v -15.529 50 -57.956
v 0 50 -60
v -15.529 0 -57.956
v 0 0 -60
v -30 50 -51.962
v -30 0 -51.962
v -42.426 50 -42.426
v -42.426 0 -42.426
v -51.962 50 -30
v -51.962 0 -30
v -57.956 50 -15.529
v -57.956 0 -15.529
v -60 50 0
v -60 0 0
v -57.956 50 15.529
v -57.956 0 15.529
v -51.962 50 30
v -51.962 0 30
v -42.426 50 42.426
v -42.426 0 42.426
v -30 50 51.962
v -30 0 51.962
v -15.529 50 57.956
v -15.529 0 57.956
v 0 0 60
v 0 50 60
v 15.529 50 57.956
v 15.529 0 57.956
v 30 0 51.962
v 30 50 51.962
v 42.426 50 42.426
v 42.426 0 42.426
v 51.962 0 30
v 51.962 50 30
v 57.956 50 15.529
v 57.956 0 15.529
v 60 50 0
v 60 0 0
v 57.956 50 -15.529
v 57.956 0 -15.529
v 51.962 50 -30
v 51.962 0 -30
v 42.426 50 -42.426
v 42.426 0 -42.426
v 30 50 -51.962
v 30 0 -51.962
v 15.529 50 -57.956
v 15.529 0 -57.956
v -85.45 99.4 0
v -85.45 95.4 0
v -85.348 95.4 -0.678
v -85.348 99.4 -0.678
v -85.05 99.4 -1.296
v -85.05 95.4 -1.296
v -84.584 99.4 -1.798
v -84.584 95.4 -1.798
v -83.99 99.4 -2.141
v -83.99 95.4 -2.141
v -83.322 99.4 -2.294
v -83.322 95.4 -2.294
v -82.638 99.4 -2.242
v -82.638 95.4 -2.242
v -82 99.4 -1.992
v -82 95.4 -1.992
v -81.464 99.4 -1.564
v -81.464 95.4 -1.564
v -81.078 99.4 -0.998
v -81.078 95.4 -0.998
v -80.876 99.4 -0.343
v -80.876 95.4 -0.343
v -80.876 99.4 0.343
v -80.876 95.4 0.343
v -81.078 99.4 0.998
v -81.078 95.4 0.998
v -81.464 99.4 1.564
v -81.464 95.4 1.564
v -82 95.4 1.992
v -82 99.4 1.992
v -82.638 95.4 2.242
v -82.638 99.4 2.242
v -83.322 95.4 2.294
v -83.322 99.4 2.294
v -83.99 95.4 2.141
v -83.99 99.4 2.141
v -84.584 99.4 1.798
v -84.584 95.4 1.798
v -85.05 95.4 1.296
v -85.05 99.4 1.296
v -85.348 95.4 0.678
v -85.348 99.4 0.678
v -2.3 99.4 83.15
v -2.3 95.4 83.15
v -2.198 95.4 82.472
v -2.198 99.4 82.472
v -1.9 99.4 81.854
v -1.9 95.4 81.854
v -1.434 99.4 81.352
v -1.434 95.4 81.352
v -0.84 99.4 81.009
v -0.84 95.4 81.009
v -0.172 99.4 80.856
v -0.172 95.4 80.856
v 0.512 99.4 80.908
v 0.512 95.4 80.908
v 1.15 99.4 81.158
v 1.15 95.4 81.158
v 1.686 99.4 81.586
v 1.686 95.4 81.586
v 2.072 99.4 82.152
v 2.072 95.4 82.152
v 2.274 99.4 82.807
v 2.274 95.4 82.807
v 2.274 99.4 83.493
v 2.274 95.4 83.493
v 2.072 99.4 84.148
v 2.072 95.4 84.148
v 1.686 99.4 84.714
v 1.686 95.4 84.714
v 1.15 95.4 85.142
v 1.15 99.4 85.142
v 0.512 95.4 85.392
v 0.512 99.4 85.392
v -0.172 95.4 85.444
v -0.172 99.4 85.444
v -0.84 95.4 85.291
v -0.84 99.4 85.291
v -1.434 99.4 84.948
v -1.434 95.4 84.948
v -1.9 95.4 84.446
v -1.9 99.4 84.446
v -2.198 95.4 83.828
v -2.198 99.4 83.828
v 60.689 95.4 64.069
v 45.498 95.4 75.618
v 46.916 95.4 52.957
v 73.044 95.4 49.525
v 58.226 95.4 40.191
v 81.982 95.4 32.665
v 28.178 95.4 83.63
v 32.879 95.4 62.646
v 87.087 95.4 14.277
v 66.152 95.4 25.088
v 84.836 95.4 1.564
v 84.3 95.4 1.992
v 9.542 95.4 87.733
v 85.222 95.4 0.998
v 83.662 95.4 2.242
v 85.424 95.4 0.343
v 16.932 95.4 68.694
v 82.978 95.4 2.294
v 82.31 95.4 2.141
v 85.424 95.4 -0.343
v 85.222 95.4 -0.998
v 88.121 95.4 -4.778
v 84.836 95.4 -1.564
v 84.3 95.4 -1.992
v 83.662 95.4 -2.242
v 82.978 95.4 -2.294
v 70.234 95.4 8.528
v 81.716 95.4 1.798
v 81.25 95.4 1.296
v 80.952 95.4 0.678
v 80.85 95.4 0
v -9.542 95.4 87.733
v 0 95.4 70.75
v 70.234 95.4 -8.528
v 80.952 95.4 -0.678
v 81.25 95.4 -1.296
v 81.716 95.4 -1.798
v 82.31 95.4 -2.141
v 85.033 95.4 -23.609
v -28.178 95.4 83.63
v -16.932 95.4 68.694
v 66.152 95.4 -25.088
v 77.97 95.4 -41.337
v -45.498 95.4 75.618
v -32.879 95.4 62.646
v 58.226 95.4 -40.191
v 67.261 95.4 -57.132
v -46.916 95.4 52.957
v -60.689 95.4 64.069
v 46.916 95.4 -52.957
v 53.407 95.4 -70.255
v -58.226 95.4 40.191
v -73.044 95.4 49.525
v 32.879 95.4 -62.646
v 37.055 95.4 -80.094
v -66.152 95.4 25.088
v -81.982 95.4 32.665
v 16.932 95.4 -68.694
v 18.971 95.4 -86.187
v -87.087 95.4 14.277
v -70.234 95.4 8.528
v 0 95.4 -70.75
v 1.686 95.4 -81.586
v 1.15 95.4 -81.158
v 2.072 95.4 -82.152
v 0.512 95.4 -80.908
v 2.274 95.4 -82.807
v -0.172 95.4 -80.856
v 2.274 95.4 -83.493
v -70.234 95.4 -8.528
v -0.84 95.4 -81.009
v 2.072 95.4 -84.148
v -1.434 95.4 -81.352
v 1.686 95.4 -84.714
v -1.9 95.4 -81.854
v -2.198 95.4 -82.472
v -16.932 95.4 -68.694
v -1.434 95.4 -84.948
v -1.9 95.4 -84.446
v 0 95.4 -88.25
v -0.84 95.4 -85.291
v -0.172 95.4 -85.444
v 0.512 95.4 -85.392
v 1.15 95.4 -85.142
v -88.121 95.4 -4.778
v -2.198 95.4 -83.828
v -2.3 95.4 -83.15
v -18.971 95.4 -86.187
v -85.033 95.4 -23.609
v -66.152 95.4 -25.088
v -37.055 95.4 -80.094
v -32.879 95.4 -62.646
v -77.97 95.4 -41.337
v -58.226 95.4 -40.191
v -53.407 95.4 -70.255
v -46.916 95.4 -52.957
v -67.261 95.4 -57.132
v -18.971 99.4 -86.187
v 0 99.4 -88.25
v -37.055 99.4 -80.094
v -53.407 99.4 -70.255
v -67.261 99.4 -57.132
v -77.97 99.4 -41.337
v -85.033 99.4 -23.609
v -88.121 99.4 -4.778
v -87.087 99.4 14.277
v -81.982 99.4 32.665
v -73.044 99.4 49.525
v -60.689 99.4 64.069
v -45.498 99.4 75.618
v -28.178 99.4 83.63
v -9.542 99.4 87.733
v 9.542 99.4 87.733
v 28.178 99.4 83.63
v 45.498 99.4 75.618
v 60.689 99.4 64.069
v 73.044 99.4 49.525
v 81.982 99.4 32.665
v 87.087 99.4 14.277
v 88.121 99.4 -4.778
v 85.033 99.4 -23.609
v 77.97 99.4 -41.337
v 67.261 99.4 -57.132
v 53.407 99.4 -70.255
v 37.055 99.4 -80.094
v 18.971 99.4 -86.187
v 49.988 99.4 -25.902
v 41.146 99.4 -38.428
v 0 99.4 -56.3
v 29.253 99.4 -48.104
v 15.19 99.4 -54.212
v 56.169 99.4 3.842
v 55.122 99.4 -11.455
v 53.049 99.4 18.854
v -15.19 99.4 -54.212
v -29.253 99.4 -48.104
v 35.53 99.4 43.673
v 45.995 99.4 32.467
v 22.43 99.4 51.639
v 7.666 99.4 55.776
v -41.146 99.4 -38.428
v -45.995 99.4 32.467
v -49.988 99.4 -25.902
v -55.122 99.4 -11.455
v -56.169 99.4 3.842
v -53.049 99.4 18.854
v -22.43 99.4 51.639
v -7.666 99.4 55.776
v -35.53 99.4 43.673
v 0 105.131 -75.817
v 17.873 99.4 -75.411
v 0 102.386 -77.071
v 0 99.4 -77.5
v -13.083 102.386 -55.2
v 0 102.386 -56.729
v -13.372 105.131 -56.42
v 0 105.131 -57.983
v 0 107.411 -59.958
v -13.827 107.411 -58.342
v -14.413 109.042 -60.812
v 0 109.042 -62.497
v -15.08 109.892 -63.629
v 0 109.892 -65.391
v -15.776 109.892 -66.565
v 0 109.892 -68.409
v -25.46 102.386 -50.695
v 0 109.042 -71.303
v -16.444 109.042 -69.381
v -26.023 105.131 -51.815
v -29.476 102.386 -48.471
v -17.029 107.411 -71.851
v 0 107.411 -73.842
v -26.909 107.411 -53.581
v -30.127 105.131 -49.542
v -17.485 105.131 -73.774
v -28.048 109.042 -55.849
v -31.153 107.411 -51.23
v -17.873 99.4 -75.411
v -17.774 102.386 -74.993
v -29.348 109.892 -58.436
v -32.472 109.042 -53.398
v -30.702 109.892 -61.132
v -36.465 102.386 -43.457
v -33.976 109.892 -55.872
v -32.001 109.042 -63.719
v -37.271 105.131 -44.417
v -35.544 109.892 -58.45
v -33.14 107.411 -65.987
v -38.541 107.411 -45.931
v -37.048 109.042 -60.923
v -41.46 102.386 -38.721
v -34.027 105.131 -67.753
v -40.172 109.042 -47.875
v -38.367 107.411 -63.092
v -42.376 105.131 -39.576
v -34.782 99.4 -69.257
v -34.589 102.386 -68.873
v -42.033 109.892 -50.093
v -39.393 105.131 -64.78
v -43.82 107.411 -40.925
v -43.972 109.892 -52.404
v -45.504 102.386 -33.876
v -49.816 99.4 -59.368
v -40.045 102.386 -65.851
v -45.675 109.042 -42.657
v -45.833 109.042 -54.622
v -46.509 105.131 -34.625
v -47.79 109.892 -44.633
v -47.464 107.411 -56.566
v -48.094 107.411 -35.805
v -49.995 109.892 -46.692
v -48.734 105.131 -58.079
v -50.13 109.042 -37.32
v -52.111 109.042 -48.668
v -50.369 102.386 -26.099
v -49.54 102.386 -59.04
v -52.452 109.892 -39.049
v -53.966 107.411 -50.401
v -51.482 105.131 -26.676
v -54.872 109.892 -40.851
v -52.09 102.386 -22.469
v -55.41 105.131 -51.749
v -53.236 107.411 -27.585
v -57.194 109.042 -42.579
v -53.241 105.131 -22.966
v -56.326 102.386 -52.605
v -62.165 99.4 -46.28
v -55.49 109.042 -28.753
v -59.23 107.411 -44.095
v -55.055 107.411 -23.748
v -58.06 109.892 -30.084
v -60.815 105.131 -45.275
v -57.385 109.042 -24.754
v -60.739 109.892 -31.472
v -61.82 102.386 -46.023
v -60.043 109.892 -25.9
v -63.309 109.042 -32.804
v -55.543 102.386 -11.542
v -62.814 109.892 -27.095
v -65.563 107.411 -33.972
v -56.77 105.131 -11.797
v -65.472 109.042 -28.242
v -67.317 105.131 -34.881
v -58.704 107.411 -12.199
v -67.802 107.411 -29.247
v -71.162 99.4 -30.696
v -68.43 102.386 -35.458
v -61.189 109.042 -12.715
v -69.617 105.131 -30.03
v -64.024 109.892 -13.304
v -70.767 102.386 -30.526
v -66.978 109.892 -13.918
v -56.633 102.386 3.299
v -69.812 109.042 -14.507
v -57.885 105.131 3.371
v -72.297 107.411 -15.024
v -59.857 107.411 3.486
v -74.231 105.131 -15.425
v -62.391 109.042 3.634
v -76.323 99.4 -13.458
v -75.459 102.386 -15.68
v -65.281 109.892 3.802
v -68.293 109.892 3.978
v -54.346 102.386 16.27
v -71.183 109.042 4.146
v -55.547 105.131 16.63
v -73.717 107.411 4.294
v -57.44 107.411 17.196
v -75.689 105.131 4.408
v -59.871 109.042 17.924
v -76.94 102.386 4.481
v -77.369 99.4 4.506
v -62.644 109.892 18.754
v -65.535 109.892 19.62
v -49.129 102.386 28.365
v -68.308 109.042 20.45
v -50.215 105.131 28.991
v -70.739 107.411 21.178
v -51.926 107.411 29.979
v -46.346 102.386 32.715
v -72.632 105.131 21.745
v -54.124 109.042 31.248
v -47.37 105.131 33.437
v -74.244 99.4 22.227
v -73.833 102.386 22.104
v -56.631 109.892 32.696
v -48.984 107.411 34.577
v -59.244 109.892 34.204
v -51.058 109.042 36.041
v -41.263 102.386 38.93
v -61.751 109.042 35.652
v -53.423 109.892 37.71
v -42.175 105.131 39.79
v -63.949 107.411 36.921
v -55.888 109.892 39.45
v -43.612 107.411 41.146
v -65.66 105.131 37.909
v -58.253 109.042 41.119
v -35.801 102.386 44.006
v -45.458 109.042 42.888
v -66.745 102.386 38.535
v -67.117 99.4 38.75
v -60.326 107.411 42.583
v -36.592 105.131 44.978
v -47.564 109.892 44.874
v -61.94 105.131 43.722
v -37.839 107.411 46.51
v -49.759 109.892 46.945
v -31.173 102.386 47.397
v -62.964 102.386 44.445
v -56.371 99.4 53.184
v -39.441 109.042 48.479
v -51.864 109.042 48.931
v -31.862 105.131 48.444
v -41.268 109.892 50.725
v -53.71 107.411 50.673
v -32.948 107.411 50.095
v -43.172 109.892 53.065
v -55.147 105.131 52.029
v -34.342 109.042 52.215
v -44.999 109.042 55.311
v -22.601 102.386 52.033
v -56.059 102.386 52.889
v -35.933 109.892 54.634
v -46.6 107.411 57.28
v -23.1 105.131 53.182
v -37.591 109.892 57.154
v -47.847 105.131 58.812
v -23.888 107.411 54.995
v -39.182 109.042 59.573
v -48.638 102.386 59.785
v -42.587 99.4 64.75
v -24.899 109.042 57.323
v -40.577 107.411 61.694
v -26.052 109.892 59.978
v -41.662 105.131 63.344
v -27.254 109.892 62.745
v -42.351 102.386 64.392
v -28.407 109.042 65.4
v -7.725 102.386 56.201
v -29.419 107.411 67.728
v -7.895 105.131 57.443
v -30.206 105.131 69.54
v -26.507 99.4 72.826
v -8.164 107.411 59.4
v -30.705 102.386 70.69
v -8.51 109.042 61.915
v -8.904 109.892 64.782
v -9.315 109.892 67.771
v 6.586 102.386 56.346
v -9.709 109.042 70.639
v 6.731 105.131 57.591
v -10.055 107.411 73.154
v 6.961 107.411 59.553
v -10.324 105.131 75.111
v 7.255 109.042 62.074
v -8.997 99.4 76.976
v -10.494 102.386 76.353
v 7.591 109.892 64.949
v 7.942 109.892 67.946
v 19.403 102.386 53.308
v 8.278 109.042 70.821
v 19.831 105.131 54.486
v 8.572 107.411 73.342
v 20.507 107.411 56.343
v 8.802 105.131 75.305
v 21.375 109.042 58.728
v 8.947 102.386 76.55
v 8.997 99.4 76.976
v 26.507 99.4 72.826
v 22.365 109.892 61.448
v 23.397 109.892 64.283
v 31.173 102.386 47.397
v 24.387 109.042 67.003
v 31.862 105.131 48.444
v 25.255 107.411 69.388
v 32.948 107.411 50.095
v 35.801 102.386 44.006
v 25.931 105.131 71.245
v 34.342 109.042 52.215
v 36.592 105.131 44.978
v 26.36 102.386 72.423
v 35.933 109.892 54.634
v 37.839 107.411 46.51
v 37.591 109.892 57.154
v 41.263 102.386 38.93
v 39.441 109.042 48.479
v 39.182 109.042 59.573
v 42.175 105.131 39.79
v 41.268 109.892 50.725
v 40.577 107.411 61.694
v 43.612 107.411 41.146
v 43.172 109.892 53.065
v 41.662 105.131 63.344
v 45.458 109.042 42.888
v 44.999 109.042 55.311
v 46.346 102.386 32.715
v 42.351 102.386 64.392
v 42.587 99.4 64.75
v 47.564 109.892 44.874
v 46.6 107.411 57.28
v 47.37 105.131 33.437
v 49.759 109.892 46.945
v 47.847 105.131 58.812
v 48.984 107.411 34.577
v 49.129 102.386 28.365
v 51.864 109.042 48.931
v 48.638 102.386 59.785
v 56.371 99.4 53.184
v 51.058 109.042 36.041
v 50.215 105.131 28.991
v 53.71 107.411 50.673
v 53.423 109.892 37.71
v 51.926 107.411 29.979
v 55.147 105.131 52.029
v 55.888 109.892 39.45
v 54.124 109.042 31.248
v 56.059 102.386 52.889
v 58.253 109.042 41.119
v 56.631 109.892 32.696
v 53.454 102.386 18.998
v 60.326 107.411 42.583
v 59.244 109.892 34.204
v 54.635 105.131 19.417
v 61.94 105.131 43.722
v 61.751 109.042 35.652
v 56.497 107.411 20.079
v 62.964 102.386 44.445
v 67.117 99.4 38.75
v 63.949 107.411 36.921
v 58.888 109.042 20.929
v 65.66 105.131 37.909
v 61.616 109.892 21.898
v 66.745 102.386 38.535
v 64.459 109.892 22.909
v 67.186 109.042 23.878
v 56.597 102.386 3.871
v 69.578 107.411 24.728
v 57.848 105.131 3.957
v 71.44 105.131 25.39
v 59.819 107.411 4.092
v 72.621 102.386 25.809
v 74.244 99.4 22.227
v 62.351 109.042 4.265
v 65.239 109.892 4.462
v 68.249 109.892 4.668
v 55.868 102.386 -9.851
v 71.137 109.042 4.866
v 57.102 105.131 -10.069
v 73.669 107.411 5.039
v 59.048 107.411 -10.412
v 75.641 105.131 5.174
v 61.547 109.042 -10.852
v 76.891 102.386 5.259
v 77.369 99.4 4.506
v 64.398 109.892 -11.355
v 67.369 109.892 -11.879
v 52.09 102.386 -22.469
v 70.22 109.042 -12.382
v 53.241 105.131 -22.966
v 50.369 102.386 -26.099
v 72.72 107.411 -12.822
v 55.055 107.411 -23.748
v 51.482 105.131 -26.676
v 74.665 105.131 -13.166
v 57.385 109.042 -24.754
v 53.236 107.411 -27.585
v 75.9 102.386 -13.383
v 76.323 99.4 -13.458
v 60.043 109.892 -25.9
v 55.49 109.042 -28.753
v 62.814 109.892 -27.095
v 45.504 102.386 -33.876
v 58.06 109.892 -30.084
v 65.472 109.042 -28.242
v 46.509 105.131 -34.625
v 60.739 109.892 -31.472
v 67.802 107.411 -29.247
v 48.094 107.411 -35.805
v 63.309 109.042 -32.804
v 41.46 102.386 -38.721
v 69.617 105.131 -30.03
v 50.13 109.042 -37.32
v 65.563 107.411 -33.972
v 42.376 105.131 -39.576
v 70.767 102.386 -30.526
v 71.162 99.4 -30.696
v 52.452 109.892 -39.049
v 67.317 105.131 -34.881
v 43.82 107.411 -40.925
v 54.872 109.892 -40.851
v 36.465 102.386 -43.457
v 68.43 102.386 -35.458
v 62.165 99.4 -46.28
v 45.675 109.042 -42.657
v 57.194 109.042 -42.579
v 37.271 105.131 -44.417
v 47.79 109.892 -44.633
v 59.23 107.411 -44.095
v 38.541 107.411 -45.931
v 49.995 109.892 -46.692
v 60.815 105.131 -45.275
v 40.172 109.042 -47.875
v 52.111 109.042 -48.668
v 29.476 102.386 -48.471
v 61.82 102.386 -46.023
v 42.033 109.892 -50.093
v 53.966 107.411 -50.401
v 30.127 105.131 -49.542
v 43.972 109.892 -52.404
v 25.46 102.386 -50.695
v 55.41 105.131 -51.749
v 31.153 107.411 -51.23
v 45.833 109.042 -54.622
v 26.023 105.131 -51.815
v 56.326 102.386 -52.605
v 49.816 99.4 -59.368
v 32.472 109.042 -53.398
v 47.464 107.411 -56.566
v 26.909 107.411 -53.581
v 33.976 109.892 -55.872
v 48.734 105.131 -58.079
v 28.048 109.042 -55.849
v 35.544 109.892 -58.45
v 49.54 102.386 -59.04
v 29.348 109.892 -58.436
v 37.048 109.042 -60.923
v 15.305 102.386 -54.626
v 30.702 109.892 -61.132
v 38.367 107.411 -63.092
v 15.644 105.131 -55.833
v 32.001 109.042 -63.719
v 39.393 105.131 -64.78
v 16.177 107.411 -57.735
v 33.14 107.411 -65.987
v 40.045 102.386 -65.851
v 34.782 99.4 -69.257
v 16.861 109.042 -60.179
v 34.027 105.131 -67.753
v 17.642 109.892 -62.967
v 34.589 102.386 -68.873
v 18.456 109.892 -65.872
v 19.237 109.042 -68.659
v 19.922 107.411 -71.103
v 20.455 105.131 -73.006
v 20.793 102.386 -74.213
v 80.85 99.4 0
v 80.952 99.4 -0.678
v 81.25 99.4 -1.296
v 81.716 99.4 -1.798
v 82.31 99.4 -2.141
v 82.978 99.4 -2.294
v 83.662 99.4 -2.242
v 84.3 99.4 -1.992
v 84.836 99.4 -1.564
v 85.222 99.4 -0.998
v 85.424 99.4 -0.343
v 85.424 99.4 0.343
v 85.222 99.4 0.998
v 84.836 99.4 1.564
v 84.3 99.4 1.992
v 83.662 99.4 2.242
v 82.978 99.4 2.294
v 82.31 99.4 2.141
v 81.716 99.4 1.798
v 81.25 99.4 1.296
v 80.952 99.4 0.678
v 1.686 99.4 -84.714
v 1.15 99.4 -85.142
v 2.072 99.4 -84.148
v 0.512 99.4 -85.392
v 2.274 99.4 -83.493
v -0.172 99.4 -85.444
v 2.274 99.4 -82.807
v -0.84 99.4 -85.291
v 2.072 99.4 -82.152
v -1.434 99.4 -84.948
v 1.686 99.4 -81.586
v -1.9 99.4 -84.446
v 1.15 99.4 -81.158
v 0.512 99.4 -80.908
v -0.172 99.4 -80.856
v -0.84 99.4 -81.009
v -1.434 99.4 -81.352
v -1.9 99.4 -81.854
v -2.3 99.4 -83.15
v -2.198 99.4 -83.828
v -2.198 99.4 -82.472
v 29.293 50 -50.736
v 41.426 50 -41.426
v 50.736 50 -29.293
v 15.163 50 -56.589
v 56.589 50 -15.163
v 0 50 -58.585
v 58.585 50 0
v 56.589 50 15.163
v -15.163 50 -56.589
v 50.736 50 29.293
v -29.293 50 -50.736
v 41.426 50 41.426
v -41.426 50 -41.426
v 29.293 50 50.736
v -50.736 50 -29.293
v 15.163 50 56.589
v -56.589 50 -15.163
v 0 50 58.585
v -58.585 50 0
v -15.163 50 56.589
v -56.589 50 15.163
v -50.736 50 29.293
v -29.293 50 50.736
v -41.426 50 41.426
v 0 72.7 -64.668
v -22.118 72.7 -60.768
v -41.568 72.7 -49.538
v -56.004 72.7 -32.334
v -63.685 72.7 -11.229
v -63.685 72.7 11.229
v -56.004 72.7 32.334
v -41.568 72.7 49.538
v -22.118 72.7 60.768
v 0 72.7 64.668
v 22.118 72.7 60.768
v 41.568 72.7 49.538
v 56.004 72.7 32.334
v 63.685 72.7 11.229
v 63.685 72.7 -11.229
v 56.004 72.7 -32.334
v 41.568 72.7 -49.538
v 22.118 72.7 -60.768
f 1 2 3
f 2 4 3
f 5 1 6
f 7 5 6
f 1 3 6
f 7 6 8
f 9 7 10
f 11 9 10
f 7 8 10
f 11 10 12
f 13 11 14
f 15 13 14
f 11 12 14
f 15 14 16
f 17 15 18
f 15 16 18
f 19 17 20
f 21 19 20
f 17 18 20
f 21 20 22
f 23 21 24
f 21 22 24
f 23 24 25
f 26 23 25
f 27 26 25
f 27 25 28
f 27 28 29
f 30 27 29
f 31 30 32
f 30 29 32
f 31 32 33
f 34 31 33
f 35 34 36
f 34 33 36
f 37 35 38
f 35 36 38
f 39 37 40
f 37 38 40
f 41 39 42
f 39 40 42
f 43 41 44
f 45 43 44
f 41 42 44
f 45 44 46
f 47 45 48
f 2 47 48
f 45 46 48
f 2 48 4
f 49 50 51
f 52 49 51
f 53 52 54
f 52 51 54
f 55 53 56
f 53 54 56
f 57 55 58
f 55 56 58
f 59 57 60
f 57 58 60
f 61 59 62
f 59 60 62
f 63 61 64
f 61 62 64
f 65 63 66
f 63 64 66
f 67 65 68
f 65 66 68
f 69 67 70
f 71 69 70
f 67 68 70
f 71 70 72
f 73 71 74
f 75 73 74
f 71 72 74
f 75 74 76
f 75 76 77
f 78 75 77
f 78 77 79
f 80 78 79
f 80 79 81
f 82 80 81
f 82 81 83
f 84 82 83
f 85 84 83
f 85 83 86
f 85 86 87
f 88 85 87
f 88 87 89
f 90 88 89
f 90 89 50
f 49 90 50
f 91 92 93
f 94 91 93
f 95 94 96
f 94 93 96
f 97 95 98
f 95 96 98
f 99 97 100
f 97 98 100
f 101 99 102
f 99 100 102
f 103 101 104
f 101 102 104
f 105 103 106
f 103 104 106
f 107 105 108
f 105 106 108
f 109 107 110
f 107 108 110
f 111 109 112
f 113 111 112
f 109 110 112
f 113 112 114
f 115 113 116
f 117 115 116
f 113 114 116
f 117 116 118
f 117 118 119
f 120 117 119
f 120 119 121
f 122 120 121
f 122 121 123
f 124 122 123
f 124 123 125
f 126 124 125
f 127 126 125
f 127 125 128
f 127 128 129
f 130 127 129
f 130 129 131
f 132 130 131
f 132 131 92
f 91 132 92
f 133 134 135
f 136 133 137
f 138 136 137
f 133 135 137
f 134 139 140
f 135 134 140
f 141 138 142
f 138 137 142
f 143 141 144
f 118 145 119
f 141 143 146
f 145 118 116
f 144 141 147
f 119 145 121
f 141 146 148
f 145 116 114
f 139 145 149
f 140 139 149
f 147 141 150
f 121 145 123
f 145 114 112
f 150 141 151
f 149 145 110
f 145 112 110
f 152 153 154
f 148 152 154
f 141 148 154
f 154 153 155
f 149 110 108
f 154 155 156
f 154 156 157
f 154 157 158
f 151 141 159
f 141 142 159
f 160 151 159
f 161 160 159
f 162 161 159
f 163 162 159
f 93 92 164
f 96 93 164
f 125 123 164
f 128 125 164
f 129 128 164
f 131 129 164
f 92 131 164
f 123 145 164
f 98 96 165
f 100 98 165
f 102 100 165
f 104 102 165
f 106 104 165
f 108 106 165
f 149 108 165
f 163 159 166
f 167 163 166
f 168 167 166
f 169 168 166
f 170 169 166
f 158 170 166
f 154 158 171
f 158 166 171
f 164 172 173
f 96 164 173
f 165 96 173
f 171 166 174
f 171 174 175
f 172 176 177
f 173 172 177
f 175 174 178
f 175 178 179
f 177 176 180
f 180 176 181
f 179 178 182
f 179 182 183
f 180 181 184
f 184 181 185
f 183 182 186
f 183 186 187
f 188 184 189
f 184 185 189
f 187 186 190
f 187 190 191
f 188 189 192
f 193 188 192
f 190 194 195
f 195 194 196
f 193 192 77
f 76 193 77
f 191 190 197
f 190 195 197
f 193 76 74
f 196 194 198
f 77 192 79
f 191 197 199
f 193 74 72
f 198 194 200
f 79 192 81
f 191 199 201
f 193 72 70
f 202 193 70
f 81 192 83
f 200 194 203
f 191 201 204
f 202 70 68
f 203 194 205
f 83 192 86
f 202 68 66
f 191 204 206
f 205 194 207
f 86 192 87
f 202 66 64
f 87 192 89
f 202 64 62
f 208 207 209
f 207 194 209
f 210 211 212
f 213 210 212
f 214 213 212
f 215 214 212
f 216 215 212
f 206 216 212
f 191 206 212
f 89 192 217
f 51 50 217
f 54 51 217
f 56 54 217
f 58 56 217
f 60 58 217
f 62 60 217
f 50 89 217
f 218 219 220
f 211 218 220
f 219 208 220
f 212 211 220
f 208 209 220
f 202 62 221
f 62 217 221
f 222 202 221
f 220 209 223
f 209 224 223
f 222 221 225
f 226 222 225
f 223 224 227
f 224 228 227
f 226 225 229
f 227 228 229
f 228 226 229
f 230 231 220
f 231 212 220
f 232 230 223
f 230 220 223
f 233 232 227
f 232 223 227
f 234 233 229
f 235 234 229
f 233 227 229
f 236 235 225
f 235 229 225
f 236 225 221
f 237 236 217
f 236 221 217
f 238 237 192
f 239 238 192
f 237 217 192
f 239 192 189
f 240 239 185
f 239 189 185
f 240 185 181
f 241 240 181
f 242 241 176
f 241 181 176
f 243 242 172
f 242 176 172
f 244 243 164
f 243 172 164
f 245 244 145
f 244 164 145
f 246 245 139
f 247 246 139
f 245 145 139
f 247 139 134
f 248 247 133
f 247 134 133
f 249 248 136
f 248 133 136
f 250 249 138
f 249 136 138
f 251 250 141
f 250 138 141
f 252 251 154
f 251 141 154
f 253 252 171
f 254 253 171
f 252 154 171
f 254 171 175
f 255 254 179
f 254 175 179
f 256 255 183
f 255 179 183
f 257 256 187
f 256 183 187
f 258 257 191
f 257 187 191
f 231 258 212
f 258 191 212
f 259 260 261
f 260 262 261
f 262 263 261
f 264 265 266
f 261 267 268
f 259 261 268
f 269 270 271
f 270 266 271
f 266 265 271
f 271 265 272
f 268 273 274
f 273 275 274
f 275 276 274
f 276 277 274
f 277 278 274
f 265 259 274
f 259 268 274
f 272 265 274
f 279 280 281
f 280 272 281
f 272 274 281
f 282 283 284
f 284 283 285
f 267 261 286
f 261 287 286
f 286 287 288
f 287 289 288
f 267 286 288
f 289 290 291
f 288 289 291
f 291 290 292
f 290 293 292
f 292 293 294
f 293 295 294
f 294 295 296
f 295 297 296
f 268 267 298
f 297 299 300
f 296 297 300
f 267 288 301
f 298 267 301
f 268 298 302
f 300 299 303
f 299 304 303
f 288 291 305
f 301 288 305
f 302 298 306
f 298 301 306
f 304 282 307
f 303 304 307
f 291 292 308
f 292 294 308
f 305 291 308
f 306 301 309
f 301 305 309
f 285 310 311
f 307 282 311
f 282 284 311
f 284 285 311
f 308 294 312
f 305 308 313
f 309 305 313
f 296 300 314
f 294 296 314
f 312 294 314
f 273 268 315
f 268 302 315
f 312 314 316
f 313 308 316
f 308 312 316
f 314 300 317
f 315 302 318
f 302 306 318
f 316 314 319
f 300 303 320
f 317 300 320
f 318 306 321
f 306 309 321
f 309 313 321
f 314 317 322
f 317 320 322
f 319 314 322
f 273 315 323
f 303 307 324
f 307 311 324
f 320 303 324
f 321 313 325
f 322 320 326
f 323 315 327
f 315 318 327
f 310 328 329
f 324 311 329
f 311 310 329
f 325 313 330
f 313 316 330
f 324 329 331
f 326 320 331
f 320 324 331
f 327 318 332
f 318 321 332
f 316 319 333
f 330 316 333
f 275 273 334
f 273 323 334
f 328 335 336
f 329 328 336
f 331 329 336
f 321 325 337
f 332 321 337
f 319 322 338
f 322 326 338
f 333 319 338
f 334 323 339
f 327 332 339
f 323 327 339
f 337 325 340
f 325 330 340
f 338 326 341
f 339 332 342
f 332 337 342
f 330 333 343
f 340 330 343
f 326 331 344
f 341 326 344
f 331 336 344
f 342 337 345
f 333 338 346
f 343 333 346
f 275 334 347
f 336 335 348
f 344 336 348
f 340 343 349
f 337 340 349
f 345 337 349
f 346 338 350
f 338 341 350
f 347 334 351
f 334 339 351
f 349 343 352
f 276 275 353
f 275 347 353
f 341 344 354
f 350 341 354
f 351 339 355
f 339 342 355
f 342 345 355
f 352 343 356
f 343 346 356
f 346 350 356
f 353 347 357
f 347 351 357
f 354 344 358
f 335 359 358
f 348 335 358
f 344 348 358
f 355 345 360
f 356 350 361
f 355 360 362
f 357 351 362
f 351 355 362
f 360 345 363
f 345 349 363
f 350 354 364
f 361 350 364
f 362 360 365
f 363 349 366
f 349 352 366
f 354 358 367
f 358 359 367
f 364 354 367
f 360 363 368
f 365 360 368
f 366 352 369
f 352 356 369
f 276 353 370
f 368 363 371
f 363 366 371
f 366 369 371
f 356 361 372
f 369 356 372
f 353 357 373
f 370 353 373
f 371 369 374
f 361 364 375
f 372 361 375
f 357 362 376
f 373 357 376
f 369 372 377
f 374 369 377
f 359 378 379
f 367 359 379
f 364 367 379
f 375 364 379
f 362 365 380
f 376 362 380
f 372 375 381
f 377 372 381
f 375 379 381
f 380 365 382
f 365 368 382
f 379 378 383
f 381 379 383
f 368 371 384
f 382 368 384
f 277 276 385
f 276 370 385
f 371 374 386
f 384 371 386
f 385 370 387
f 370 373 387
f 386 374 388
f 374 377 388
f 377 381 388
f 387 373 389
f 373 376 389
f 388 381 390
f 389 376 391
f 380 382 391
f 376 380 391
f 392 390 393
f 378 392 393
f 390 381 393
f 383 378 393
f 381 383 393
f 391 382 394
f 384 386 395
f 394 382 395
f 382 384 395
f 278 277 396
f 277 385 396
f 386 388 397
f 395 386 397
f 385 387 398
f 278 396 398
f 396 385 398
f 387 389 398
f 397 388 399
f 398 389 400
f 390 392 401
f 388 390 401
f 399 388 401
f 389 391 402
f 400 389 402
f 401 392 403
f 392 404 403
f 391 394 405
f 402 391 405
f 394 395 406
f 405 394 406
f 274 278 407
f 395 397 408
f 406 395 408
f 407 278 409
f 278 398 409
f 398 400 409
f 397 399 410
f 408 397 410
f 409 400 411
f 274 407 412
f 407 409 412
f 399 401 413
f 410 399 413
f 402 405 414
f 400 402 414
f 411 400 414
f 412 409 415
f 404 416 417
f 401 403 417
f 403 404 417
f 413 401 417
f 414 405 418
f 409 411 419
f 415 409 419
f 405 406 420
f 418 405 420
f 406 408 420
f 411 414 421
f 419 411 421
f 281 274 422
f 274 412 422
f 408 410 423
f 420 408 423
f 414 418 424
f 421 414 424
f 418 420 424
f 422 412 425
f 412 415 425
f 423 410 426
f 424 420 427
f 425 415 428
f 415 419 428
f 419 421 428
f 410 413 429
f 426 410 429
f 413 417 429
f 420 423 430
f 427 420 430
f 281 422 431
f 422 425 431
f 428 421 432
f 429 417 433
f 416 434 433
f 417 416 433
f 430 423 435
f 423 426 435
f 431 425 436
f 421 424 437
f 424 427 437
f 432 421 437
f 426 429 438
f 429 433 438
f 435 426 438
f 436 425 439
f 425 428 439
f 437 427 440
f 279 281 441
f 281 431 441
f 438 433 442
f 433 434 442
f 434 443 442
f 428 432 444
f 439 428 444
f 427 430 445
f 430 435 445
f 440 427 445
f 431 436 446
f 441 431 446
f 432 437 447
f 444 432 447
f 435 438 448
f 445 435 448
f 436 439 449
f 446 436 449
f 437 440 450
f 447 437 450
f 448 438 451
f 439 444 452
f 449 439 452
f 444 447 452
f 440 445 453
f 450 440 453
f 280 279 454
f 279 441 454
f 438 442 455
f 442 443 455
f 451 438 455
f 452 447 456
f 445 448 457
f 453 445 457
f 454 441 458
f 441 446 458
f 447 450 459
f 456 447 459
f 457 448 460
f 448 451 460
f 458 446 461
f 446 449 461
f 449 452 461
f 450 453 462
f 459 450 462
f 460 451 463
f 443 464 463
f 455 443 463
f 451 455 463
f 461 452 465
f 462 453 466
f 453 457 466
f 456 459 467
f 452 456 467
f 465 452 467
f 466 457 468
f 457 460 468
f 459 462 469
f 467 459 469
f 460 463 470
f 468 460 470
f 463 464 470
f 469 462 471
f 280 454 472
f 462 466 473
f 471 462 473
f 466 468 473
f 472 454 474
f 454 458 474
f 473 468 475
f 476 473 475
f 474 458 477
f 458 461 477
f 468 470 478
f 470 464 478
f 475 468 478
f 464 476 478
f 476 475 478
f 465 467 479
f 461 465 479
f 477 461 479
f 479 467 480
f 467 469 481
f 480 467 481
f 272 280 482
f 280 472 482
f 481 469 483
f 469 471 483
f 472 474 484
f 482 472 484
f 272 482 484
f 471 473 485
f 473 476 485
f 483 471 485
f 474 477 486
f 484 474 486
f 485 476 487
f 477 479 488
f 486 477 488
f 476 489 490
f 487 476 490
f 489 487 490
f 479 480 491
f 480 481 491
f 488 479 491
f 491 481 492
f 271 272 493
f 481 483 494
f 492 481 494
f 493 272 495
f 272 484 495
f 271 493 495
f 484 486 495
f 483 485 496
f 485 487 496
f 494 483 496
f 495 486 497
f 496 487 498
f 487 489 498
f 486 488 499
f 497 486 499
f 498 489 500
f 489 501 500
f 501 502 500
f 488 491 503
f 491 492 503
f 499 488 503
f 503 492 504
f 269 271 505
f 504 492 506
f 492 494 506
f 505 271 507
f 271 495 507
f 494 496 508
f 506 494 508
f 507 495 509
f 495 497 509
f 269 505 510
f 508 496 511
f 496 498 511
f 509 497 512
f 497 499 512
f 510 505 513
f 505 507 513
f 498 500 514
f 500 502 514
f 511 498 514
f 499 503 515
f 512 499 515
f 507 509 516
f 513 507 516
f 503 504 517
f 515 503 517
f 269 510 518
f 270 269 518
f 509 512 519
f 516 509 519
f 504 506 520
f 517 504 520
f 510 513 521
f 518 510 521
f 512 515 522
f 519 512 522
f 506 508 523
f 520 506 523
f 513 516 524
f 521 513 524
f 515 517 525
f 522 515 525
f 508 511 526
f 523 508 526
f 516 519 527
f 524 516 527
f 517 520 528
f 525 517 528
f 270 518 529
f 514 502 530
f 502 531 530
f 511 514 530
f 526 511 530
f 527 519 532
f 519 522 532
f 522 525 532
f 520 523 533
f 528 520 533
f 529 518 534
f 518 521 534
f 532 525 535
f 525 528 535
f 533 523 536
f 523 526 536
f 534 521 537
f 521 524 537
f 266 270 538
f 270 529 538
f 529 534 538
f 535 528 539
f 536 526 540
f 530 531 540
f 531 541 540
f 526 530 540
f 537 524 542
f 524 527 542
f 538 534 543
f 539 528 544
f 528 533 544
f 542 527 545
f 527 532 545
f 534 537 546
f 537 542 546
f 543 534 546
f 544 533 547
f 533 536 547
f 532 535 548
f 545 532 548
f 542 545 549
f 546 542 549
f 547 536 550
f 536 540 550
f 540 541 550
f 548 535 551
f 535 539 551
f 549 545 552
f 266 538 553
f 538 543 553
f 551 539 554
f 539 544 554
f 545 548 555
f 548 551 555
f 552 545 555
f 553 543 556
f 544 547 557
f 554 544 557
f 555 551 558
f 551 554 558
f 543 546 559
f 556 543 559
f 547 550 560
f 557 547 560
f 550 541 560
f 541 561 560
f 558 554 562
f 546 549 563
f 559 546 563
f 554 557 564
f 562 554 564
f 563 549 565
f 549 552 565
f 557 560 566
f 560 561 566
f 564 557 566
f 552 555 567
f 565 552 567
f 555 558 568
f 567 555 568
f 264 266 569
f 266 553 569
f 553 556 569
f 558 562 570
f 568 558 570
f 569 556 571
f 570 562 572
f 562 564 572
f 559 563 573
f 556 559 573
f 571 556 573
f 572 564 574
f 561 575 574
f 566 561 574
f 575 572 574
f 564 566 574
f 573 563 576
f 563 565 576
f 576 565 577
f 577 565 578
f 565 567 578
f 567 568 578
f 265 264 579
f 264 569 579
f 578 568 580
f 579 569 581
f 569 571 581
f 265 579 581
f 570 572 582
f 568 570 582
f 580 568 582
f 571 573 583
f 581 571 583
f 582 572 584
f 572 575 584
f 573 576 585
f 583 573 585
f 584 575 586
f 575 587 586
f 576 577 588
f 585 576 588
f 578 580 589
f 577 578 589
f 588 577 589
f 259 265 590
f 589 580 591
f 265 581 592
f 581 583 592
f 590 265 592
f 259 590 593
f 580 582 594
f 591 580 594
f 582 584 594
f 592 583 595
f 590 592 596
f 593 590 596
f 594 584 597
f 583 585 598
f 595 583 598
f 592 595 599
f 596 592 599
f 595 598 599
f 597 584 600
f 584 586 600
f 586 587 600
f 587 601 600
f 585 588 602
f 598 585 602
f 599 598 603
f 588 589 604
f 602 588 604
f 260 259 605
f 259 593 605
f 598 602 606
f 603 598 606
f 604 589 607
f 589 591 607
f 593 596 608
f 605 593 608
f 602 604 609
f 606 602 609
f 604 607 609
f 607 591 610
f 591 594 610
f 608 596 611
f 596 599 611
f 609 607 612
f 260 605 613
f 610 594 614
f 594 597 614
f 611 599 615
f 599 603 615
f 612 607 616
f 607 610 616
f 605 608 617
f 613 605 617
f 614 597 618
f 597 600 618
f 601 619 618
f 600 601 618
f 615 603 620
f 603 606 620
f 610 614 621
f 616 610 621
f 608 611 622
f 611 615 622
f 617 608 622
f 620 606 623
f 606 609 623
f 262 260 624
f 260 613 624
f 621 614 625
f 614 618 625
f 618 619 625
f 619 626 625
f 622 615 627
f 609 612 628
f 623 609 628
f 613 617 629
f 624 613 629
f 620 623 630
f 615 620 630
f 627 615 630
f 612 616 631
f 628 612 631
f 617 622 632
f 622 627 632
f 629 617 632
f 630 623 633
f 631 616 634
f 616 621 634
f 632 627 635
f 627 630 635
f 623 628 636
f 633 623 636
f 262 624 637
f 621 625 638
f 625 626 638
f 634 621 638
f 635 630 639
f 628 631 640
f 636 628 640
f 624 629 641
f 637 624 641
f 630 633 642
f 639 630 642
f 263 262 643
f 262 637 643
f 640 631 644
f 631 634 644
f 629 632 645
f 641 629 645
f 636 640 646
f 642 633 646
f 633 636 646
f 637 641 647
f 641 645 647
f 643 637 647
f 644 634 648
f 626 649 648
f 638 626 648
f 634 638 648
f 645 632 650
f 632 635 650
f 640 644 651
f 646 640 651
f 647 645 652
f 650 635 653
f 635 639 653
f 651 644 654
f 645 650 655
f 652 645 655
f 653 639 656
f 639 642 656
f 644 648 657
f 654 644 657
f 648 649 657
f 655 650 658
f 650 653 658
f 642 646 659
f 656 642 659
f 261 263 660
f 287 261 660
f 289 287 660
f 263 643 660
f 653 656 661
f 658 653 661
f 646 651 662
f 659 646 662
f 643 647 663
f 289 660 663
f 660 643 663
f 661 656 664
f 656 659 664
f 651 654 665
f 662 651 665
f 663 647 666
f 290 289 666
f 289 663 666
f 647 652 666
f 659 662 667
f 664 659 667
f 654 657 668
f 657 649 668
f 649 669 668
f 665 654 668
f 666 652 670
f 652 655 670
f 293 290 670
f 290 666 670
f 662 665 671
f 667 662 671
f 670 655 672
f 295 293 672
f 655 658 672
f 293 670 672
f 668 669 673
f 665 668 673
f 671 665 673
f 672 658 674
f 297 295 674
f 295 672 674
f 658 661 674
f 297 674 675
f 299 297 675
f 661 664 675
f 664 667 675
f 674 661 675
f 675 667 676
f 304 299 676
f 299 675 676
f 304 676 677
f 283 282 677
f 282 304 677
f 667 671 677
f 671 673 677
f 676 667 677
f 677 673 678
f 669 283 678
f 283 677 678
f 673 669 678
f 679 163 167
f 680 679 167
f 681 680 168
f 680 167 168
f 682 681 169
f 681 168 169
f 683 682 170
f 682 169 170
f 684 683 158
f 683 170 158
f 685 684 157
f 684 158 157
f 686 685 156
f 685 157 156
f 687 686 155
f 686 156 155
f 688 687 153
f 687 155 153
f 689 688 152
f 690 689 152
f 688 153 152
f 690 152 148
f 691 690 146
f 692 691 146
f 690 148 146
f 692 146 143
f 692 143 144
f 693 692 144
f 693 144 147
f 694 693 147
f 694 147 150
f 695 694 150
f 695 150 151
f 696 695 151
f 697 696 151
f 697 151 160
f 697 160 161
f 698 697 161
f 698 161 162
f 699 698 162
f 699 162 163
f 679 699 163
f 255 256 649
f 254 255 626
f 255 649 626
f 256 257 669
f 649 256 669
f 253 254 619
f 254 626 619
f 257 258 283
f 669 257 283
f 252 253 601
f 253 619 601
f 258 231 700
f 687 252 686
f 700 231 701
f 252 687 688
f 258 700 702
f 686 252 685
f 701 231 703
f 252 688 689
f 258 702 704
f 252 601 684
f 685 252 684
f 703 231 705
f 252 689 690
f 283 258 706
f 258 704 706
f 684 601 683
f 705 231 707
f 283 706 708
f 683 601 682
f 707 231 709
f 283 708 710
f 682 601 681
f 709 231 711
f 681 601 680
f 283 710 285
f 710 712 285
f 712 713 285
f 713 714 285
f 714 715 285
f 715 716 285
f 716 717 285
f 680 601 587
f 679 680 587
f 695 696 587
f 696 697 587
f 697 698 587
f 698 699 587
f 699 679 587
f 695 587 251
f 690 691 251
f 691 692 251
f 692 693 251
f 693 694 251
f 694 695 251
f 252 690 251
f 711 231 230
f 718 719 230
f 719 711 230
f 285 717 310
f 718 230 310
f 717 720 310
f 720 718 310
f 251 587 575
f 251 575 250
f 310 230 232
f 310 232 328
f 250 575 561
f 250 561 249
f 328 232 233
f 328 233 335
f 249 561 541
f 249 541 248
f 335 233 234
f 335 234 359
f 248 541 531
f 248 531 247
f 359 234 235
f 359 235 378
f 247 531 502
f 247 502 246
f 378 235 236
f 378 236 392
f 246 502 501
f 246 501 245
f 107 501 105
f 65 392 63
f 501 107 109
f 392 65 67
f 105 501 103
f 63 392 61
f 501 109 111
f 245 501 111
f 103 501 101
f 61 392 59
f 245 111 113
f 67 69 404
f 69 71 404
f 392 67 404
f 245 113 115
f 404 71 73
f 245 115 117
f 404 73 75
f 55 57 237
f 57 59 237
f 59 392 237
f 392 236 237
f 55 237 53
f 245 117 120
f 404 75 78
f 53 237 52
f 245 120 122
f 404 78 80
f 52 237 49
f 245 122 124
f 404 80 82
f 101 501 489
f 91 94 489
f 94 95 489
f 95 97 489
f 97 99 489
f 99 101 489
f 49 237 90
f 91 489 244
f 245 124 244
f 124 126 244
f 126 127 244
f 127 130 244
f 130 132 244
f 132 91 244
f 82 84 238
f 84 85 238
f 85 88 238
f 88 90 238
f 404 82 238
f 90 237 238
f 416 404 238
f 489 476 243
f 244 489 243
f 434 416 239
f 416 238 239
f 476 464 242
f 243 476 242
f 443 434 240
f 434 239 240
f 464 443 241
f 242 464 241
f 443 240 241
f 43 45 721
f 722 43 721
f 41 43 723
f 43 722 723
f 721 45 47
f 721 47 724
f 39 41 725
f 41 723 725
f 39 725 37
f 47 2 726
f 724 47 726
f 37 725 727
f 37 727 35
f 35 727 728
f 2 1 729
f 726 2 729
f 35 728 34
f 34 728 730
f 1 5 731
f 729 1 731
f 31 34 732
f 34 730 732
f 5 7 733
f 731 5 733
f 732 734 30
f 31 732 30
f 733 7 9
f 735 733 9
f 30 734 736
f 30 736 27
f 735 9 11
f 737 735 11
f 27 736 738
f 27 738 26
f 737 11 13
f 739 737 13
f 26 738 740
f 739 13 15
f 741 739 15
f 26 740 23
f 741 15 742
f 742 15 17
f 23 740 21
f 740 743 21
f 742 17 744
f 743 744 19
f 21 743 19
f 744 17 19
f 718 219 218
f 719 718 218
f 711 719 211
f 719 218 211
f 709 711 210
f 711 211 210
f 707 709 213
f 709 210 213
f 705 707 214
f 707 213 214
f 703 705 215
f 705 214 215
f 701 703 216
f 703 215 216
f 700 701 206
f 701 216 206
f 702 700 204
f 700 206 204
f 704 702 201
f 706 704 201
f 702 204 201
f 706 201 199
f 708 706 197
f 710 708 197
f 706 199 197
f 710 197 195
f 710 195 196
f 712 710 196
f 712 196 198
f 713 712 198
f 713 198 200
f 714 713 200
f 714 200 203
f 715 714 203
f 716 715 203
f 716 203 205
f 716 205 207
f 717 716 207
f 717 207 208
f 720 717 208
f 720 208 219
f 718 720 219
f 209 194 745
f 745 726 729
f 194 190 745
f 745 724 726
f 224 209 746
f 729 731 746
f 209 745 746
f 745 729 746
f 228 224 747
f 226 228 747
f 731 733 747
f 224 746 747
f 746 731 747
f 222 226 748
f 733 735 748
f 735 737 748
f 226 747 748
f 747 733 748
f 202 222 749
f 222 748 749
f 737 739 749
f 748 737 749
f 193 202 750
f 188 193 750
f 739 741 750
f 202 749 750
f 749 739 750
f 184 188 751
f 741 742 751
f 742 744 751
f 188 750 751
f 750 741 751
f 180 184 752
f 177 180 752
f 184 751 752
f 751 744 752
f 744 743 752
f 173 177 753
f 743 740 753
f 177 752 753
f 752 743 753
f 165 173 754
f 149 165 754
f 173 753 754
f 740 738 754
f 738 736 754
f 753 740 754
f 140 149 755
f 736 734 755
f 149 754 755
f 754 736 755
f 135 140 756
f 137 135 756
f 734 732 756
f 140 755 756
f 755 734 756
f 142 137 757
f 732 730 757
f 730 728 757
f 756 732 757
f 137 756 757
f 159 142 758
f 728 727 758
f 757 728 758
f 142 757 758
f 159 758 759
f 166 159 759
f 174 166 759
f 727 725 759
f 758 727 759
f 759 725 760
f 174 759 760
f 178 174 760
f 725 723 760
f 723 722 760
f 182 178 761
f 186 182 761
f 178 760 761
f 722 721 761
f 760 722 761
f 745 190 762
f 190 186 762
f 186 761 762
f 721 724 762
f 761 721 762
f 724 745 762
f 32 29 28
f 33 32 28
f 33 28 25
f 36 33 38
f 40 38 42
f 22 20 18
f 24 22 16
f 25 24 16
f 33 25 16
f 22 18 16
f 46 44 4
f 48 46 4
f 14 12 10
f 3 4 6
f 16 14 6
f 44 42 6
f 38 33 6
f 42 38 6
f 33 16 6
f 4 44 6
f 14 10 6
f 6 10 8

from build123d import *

# Parameters (mm, degrees)
F_4_6_4_6_DIAMETER_HOLE1_D = 4.6


with BuildPart() as part:
    # Sketch1 → Revolve1 (revolve)
    with BuildSketch(Plane.XY, mode=Mode.PRIVATE) as revolve1_sk:
        with BuildLine():
            Line((0, 99.4), (56.3, 99.4))
            ThreePointArc((56.3, 99.4), (66.9, 110), (77.5, 99.4))
            Line((77.5, 99.4), (88.25, 99.4))
            Line((88.25, 99.4), (88.25, 95.4))
            Line((88.25, 95.4), (70.75, 95.4))
            Line((70.75, 95.4), (58.585106664, 50))
            Line((58.585106664, 50), (60, 50))
            Line((60, 50), (60, 0))
            Line((60, 0), (0, 0))
            Line((0, 0), (0, 99.4))
        make_face()
    revolve(revolve1_sk.sketch.rotate(Axis((0, -46.308457921, 0), (0, 1, 0)), 90), axis=Axis((0, -46.308457921, 0), (0, 1, 0)))

    # Ø4.6 (4.6) Diameter Hole1 (through all)
    with Locations(Plane(origin=(0, 99.4, 0), x_dir=(1, 0, 0), z_dir=(0, 1, 0))):
        with Locations((0, -83.15), (-83.15, 0), (0, 83.15), (83.15, 0)):
            Hole(F_4_6_4_6_DIAMETER_HOLE1_D / 2)


solid = part.part
